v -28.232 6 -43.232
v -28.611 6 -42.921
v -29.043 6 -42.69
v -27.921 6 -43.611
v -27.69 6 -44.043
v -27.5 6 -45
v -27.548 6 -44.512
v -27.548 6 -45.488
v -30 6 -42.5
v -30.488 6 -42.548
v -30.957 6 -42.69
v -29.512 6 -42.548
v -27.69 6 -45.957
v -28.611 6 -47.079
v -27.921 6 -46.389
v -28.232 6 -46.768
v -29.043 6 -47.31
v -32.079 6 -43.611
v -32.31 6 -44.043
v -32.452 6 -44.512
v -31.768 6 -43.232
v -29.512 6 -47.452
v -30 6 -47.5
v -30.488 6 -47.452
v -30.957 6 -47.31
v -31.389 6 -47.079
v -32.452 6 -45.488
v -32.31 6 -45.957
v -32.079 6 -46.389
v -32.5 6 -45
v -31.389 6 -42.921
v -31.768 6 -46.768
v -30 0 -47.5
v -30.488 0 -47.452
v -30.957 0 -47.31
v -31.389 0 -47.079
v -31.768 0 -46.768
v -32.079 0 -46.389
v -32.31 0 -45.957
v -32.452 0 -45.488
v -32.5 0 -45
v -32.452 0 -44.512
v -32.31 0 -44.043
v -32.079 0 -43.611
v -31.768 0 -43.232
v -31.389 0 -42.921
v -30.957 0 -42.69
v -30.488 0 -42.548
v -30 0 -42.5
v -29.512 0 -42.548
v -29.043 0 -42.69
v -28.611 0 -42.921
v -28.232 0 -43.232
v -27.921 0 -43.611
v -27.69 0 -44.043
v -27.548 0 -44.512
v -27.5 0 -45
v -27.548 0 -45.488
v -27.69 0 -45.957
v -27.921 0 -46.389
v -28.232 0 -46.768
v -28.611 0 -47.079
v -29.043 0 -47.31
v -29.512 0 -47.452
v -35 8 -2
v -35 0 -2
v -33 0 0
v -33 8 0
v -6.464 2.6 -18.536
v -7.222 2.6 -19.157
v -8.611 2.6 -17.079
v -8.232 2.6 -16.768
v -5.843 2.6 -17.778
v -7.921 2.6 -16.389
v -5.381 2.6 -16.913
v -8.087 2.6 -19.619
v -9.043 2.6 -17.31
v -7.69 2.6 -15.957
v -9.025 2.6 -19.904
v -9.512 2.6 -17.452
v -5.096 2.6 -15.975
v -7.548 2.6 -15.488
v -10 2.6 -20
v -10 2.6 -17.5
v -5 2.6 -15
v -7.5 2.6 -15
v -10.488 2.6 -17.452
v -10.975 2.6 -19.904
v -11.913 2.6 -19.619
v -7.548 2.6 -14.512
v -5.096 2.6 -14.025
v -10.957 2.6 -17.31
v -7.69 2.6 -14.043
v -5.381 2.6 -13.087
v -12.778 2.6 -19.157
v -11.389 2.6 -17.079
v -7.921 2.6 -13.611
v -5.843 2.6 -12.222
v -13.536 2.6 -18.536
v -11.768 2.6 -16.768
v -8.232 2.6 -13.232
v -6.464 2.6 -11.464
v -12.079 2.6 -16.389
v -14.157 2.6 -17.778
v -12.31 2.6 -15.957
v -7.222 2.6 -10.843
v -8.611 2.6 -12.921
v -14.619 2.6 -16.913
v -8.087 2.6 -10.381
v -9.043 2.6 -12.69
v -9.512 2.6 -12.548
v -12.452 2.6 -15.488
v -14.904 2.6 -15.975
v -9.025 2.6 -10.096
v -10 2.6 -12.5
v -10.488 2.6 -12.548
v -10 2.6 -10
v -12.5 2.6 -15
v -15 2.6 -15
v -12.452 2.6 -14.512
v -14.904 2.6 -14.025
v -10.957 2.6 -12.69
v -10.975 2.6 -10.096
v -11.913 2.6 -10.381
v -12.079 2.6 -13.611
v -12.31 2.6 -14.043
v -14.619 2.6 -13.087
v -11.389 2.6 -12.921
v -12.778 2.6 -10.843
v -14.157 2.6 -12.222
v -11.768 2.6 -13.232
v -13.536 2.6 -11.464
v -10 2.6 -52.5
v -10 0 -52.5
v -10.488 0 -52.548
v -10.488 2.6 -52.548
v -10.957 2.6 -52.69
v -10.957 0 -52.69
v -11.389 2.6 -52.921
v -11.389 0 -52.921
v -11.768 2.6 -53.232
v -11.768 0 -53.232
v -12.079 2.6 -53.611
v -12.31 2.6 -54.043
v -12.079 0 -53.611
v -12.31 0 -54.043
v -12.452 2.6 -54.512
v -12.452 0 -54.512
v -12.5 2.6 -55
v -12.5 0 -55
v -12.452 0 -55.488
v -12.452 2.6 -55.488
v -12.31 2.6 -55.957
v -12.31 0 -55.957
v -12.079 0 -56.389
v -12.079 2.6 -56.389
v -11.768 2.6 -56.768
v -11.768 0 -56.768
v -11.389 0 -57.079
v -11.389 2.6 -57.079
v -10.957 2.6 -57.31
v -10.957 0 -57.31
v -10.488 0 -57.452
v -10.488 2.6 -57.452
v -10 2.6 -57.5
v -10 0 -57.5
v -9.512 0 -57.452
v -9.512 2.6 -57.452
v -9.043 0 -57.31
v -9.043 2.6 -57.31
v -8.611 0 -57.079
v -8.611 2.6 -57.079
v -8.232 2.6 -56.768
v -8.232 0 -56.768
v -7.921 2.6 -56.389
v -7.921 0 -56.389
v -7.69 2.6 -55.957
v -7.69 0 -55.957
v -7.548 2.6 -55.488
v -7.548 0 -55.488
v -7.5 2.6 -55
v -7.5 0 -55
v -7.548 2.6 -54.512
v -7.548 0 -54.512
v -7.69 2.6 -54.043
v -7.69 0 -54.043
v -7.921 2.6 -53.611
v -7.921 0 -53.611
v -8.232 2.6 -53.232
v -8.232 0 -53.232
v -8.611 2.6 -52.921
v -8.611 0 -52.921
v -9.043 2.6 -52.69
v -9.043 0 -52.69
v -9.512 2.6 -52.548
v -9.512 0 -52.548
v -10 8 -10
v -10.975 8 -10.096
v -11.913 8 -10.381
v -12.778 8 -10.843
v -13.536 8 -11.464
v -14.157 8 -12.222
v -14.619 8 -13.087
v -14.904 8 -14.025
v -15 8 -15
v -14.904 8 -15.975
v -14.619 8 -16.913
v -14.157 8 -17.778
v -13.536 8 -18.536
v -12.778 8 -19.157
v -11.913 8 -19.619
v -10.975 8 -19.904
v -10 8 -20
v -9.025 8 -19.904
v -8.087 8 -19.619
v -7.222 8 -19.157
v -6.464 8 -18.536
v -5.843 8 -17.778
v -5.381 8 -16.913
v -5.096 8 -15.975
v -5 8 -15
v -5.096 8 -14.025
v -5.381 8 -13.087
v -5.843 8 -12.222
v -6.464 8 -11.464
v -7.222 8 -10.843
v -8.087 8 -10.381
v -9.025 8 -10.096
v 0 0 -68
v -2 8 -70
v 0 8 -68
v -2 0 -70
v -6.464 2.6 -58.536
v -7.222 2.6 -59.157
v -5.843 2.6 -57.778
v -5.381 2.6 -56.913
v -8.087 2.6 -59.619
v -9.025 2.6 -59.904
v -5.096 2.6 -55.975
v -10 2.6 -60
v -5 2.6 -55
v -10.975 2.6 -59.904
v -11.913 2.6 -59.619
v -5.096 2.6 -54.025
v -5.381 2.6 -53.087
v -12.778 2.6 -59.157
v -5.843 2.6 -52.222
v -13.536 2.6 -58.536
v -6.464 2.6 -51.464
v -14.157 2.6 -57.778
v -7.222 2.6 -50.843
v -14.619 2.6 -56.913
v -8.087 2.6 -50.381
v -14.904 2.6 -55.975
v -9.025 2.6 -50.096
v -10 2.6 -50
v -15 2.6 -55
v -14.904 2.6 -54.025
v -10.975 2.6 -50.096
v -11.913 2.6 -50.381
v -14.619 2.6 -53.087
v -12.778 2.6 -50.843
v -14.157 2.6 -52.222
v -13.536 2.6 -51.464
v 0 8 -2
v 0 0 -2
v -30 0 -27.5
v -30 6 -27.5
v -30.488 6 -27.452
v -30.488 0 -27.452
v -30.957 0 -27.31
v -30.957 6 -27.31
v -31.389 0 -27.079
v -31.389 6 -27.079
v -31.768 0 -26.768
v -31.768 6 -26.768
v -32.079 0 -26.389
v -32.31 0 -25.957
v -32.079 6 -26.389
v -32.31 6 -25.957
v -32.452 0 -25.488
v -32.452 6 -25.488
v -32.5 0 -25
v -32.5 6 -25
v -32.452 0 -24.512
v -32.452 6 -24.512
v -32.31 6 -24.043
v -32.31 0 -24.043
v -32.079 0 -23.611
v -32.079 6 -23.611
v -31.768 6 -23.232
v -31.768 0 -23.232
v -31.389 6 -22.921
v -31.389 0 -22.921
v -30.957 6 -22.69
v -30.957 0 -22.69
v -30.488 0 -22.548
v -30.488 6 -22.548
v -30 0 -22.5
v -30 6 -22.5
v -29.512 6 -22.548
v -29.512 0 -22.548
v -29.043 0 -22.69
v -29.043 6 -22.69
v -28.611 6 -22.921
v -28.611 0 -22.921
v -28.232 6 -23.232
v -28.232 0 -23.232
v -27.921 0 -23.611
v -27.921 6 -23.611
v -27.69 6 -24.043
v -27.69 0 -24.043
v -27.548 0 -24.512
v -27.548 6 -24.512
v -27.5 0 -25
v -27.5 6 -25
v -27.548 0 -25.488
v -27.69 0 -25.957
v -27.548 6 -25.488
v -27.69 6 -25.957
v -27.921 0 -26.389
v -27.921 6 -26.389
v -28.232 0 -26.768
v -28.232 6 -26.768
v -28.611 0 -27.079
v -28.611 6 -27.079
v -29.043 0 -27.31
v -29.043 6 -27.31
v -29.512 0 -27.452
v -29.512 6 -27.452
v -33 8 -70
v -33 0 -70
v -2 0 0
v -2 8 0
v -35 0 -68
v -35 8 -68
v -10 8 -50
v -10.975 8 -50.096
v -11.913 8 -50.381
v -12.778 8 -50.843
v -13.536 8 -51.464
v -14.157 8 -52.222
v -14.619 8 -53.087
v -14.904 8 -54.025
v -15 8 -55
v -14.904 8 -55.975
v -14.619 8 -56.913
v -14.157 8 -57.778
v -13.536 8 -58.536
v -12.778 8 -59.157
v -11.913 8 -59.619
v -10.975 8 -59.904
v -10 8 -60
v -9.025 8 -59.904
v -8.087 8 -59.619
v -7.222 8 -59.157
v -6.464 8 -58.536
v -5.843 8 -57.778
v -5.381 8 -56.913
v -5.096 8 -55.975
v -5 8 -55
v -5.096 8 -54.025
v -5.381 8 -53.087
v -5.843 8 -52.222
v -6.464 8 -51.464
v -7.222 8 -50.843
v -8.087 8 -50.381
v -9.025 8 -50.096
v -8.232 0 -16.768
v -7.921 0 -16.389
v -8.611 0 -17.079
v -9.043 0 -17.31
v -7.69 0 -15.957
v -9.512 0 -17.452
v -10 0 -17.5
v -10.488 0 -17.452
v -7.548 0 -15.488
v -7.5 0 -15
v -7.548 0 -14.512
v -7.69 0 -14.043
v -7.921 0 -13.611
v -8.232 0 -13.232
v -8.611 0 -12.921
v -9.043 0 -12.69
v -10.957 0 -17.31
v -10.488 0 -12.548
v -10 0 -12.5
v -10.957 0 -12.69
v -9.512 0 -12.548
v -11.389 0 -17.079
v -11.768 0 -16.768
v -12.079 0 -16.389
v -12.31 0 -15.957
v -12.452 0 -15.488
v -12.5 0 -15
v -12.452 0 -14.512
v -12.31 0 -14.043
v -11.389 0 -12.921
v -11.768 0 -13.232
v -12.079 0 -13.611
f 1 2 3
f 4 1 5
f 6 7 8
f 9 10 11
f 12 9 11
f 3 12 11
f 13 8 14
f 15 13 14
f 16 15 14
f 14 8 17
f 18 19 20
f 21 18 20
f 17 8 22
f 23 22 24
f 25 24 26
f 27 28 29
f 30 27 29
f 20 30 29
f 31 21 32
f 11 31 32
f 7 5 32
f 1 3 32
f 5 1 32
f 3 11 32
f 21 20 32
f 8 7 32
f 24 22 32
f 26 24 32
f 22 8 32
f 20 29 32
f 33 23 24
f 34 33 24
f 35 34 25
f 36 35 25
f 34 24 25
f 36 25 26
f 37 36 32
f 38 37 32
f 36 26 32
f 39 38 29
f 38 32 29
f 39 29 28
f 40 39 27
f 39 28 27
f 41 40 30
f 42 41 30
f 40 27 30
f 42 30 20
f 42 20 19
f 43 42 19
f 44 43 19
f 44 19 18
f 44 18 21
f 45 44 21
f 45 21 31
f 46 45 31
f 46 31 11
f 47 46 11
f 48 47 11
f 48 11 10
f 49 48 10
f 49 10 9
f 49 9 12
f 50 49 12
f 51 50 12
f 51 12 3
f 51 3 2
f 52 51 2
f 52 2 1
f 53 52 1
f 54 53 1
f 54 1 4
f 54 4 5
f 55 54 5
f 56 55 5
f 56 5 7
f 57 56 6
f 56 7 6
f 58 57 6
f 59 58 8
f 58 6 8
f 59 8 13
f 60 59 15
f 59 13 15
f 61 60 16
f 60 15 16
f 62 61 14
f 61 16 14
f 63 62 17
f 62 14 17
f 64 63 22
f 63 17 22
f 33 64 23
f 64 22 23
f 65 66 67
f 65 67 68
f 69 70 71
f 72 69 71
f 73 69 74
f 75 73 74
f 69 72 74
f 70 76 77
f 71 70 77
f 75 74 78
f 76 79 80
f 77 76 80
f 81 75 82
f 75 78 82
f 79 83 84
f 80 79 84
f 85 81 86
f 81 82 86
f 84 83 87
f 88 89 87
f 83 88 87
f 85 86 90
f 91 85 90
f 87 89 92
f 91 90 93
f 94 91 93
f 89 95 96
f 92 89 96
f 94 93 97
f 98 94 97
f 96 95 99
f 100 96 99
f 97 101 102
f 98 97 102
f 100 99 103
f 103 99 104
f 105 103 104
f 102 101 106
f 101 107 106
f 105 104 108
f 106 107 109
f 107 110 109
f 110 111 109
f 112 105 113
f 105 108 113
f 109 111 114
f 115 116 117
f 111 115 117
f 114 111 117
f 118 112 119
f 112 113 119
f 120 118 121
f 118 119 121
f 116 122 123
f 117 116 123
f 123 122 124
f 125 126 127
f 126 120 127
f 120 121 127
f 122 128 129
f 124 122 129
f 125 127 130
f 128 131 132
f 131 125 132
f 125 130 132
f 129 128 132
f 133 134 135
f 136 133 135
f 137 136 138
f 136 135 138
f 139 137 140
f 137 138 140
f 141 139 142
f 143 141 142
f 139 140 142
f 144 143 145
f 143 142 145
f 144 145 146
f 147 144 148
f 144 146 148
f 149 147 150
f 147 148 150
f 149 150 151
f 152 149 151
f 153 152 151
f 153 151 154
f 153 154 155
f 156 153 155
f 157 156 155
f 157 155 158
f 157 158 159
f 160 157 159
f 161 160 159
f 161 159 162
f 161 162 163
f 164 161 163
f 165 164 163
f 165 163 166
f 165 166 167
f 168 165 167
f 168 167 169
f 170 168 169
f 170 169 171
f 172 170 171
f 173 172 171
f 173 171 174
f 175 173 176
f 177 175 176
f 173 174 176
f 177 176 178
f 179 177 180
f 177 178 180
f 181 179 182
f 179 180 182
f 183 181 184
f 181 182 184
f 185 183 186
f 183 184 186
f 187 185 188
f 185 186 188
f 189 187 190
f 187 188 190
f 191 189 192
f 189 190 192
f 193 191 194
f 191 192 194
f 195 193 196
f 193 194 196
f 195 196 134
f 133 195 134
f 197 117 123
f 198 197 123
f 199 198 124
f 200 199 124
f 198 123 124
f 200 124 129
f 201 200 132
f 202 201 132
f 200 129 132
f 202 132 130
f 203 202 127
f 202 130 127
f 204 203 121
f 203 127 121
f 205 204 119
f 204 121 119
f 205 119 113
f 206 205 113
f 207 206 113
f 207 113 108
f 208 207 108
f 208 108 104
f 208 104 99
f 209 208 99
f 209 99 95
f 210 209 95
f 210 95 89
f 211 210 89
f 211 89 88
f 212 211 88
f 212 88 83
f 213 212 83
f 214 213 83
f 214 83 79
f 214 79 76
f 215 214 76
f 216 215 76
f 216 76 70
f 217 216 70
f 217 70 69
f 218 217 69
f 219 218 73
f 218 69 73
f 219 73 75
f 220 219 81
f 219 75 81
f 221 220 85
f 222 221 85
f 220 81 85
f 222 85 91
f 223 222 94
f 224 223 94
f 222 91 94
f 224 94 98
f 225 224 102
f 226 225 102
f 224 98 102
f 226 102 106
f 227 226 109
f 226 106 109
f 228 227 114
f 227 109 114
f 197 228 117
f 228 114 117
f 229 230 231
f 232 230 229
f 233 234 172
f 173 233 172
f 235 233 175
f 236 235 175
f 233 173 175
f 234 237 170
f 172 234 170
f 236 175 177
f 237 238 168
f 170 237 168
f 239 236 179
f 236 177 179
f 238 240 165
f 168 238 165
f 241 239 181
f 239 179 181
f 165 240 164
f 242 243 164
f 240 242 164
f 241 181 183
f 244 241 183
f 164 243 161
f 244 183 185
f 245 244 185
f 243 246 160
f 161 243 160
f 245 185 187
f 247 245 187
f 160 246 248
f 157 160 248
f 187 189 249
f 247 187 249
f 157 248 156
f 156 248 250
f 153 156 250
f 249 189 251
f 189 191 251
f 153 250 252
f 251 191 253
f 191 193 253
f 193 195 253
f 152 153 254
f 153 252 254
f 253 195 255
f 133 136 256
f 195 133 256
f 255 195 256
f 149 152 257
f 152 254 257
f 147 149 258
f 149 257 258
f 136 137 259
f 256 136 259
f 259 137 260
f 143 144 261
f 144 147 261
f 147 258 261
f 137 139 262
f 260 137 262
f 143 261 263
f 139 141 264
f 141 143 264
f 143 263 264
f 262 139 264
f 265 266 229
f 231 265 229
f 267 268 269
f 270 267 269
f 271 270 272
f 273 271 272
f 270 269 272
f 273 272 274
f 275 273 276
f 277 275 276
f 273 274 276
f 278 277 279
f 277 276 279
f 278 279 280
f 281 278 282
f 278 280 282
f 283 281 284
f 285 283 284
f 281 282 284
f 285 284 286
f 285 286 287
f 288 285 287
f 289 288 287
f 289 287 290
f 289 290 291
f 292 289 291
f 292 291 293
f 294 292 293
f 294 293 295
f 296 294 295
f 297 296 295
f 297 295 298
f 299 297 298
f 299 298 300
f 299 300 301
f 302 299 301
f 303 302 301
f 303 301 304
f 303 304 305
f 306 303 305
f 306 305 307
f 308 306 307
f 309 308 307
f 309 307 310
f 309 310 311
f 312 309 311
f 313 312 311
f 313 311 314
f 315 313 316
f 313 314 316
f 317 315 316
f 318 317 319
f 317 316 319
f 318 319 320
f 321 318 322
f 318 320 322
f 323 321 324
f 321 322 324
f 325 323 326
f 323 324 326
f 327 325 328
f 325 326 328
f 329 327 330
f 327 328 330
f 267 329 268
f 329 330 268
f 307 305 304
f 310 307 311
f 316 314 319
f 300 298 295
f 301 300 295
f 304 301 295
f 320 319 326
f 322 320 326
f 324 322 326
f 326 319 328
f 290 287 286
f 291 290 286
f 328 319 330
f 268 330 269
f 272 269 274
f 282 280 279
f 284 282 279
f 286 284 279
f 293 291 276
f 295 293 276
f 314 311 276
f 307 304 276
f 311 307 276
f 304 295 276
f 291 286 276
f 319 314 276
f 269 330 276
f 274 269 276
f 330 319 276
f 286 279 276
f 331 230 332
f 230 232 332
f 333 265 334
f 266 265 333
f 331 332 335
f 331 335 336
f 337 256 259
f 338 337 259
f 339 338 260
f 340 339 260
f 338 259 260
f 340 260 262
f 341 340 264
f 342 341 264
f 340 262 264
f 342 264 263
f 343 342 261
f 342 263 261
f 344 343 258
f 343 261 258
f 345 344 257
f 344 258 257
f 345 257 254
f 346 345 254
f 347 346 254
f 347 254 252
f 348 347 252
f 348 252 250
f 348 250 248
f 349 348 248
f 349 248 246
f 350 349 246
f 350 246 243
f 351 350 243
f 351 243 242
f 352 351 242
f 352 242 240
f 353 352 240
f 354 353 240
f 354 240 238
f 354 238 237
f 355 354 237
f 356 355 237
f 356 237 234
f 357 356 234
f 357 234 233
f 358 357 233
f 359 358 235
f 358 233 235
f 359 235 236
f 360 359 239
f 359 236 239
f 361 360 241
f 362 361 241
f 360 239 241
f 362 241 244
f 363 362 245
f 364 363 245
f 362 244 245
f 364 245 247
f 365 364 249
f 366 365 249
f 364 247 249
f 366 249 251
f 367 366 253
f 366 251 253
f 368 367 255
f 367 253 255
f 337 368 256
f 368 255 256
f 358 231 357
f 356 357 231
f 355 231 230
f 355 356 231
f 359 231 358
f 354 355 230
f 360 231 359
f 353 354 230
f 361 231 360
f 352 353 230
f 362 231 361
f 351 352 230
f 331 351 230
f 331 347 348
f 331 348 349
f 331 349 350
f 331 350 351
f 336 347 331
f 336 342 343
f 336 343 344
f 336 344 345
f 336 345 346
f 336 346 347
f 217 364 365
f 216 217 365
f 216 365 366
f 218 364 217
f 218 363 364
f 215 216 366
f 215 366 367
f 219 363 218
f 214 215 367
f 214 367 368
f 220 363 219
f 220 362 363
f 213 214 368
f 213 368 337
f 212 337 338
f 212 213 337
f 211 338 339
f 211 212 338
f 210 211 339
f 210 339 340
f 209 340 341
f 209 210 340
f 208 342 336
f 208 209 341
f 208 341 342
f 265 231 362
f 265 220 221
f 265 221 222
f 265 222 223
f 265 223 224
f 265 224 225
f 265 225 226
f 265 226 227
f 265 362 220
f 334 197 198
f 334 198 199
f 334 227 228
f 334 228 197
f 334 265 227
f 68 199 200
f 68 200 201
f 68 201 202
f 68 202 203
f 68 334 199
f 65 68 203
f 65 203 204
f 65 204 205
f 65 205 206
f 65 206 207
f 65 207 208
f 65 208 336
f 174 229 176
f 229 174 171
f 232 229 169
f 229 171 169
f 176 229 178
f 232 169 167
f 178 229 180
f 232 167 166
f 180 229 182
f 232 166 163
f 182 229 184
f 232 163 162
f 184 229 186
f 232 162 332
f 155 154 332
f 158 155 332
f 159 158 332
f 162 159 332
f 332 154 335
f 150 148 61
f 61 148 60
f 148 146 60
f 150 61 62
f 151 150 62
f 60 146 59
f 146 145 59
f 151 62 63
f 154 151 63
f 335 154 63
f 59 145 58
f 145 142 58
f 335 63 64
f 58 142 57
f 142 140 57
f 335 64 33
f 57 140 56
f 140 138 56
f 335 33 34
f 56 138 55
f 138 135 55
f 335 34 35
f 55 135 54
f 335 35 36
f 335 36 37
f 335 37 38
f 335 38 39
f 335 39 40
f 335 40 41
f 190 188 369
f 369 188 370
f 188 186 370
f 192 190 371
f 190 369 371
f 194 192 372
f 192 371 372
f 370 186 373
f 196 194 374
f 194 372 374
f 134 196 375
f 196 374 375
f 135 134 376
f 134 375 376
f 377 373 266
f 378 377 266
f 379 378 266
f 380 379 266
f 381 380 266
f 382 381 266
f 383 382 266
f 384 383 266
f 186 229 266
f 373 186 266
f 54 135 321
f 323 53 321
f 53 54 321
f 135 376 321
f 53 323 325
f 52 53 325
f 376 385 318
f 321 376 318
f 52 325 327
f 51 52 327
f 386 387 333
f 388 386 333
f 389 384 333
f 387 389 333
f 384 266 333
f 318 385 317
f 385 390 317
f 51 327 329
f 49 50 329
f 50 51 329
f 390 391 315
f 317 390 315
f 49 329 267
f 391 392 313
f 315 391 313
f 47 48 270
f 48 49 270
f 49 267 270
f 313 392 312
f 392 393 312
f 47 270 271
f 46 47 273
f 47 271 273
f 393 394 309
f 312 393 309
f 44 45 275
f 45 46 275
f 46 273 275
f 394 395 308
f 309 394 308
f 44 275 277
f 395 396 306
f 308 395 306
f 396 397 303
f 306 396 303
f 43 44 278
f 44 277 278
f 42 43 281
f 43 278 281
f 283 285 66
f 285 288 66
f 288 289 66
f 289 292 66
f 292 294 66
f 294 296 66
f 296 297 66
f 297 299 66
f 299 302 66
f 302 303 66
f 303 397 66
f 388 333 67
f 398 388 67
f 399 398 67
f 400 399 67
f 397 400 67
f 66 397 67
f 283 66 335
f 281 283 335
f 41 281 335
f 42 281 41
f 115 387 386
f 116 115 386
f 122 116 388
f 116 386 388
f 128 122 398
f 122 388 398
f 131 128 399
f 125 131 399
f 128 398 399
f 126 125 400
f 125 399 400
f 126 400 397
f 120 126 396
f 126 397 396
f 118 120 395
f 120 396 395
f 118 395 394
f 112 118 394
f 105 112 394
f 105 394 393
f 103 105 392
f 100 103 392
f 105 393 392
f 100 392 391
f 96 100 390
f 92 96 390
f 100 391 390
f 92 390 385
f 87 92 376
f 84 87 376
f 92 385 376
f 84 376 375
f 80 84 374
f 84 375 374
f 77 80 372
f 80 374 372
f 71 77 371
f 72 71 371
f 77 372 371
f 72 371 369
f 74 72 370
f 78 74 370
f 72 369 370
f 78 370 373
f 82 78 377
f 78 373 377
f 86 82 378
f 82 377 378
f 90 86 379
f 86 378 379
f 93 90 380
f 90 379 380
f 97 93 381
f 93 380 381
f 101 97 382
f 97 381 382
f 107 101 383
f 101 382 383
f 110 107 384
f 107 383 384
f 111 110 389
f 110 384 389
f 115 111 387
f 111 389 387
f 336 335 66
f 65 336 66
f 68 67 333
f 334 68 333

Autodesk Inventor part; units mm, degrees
ref_plane "YZ Plane" through (0, 0, 0) normal (1, 0, 0) x (0, 1, 0)
ref_plane "XZ Plane" through (0, 0, 0) normal (0, 1, 0) x (-1, 0, 0)
ref_plane "XY Plane" through (0, 0, 0) normal (0, 0, 1) x (1, 0, 0)
sketch "Skizze3" plane through (0, 0, 0) normal (0, 1, 0) x (-1, 0, 0)
  line L0 (0, 0) -> (0, -70)
  line L1 (0, -70) -> (35, -70)
  line L2 (35, -70) -> (35, 0)
  line L3 (35, 0) -> (0, 0)
  point P0 (30, -25)
  point P1 (30, -45)
  point P2 (35, -35)
  point P3 (10, -15)
  point P4 (10, -55)
  dimension "d4" = 35
  dimension "d5" = 70
  dimension "d6" = 5
  dimension "d7" = 5
  dimension "d8" = 10
  dimension "d9" = 10
  dimension "d10" = 15
  dimension "d11" = 15
  dimension "d12" = 10
  dimension "d13" = 10
extrude "Extrusion3" add sketch "Skizze3" along normal blind 8
hole "Bohrung1" at (-30, 0, -45) at (-30, 0, -25) direction (0, 1, 0) diameter 5 depth 6
sketch "Skizze4" plane through (0, 8, 0) normal (0, 1, 0) x (1, 0, 0)
  point P0 (0, 0)
  point P1 (-10, 15)
  point P2 (-10, 55)
  point P3 (-10, 15)
  point P4 (-10, 55)
hole "Bohrung2" at (-10, 8, -15) at (-10, 8, -55) direction (0, -1, 0) diameter 5 end through all counterbore diameter 10 counterbore depth 5.4
chamfer "Fase1" distance 2 angle 45 4 edges at (-35, 4, 0) (0, 4, 0) (0, 4, -70) (-35, 4, -70)
properties part number "BT503_trajan20_21" material "Kunststoff, undurchsichtig Schwarz"
